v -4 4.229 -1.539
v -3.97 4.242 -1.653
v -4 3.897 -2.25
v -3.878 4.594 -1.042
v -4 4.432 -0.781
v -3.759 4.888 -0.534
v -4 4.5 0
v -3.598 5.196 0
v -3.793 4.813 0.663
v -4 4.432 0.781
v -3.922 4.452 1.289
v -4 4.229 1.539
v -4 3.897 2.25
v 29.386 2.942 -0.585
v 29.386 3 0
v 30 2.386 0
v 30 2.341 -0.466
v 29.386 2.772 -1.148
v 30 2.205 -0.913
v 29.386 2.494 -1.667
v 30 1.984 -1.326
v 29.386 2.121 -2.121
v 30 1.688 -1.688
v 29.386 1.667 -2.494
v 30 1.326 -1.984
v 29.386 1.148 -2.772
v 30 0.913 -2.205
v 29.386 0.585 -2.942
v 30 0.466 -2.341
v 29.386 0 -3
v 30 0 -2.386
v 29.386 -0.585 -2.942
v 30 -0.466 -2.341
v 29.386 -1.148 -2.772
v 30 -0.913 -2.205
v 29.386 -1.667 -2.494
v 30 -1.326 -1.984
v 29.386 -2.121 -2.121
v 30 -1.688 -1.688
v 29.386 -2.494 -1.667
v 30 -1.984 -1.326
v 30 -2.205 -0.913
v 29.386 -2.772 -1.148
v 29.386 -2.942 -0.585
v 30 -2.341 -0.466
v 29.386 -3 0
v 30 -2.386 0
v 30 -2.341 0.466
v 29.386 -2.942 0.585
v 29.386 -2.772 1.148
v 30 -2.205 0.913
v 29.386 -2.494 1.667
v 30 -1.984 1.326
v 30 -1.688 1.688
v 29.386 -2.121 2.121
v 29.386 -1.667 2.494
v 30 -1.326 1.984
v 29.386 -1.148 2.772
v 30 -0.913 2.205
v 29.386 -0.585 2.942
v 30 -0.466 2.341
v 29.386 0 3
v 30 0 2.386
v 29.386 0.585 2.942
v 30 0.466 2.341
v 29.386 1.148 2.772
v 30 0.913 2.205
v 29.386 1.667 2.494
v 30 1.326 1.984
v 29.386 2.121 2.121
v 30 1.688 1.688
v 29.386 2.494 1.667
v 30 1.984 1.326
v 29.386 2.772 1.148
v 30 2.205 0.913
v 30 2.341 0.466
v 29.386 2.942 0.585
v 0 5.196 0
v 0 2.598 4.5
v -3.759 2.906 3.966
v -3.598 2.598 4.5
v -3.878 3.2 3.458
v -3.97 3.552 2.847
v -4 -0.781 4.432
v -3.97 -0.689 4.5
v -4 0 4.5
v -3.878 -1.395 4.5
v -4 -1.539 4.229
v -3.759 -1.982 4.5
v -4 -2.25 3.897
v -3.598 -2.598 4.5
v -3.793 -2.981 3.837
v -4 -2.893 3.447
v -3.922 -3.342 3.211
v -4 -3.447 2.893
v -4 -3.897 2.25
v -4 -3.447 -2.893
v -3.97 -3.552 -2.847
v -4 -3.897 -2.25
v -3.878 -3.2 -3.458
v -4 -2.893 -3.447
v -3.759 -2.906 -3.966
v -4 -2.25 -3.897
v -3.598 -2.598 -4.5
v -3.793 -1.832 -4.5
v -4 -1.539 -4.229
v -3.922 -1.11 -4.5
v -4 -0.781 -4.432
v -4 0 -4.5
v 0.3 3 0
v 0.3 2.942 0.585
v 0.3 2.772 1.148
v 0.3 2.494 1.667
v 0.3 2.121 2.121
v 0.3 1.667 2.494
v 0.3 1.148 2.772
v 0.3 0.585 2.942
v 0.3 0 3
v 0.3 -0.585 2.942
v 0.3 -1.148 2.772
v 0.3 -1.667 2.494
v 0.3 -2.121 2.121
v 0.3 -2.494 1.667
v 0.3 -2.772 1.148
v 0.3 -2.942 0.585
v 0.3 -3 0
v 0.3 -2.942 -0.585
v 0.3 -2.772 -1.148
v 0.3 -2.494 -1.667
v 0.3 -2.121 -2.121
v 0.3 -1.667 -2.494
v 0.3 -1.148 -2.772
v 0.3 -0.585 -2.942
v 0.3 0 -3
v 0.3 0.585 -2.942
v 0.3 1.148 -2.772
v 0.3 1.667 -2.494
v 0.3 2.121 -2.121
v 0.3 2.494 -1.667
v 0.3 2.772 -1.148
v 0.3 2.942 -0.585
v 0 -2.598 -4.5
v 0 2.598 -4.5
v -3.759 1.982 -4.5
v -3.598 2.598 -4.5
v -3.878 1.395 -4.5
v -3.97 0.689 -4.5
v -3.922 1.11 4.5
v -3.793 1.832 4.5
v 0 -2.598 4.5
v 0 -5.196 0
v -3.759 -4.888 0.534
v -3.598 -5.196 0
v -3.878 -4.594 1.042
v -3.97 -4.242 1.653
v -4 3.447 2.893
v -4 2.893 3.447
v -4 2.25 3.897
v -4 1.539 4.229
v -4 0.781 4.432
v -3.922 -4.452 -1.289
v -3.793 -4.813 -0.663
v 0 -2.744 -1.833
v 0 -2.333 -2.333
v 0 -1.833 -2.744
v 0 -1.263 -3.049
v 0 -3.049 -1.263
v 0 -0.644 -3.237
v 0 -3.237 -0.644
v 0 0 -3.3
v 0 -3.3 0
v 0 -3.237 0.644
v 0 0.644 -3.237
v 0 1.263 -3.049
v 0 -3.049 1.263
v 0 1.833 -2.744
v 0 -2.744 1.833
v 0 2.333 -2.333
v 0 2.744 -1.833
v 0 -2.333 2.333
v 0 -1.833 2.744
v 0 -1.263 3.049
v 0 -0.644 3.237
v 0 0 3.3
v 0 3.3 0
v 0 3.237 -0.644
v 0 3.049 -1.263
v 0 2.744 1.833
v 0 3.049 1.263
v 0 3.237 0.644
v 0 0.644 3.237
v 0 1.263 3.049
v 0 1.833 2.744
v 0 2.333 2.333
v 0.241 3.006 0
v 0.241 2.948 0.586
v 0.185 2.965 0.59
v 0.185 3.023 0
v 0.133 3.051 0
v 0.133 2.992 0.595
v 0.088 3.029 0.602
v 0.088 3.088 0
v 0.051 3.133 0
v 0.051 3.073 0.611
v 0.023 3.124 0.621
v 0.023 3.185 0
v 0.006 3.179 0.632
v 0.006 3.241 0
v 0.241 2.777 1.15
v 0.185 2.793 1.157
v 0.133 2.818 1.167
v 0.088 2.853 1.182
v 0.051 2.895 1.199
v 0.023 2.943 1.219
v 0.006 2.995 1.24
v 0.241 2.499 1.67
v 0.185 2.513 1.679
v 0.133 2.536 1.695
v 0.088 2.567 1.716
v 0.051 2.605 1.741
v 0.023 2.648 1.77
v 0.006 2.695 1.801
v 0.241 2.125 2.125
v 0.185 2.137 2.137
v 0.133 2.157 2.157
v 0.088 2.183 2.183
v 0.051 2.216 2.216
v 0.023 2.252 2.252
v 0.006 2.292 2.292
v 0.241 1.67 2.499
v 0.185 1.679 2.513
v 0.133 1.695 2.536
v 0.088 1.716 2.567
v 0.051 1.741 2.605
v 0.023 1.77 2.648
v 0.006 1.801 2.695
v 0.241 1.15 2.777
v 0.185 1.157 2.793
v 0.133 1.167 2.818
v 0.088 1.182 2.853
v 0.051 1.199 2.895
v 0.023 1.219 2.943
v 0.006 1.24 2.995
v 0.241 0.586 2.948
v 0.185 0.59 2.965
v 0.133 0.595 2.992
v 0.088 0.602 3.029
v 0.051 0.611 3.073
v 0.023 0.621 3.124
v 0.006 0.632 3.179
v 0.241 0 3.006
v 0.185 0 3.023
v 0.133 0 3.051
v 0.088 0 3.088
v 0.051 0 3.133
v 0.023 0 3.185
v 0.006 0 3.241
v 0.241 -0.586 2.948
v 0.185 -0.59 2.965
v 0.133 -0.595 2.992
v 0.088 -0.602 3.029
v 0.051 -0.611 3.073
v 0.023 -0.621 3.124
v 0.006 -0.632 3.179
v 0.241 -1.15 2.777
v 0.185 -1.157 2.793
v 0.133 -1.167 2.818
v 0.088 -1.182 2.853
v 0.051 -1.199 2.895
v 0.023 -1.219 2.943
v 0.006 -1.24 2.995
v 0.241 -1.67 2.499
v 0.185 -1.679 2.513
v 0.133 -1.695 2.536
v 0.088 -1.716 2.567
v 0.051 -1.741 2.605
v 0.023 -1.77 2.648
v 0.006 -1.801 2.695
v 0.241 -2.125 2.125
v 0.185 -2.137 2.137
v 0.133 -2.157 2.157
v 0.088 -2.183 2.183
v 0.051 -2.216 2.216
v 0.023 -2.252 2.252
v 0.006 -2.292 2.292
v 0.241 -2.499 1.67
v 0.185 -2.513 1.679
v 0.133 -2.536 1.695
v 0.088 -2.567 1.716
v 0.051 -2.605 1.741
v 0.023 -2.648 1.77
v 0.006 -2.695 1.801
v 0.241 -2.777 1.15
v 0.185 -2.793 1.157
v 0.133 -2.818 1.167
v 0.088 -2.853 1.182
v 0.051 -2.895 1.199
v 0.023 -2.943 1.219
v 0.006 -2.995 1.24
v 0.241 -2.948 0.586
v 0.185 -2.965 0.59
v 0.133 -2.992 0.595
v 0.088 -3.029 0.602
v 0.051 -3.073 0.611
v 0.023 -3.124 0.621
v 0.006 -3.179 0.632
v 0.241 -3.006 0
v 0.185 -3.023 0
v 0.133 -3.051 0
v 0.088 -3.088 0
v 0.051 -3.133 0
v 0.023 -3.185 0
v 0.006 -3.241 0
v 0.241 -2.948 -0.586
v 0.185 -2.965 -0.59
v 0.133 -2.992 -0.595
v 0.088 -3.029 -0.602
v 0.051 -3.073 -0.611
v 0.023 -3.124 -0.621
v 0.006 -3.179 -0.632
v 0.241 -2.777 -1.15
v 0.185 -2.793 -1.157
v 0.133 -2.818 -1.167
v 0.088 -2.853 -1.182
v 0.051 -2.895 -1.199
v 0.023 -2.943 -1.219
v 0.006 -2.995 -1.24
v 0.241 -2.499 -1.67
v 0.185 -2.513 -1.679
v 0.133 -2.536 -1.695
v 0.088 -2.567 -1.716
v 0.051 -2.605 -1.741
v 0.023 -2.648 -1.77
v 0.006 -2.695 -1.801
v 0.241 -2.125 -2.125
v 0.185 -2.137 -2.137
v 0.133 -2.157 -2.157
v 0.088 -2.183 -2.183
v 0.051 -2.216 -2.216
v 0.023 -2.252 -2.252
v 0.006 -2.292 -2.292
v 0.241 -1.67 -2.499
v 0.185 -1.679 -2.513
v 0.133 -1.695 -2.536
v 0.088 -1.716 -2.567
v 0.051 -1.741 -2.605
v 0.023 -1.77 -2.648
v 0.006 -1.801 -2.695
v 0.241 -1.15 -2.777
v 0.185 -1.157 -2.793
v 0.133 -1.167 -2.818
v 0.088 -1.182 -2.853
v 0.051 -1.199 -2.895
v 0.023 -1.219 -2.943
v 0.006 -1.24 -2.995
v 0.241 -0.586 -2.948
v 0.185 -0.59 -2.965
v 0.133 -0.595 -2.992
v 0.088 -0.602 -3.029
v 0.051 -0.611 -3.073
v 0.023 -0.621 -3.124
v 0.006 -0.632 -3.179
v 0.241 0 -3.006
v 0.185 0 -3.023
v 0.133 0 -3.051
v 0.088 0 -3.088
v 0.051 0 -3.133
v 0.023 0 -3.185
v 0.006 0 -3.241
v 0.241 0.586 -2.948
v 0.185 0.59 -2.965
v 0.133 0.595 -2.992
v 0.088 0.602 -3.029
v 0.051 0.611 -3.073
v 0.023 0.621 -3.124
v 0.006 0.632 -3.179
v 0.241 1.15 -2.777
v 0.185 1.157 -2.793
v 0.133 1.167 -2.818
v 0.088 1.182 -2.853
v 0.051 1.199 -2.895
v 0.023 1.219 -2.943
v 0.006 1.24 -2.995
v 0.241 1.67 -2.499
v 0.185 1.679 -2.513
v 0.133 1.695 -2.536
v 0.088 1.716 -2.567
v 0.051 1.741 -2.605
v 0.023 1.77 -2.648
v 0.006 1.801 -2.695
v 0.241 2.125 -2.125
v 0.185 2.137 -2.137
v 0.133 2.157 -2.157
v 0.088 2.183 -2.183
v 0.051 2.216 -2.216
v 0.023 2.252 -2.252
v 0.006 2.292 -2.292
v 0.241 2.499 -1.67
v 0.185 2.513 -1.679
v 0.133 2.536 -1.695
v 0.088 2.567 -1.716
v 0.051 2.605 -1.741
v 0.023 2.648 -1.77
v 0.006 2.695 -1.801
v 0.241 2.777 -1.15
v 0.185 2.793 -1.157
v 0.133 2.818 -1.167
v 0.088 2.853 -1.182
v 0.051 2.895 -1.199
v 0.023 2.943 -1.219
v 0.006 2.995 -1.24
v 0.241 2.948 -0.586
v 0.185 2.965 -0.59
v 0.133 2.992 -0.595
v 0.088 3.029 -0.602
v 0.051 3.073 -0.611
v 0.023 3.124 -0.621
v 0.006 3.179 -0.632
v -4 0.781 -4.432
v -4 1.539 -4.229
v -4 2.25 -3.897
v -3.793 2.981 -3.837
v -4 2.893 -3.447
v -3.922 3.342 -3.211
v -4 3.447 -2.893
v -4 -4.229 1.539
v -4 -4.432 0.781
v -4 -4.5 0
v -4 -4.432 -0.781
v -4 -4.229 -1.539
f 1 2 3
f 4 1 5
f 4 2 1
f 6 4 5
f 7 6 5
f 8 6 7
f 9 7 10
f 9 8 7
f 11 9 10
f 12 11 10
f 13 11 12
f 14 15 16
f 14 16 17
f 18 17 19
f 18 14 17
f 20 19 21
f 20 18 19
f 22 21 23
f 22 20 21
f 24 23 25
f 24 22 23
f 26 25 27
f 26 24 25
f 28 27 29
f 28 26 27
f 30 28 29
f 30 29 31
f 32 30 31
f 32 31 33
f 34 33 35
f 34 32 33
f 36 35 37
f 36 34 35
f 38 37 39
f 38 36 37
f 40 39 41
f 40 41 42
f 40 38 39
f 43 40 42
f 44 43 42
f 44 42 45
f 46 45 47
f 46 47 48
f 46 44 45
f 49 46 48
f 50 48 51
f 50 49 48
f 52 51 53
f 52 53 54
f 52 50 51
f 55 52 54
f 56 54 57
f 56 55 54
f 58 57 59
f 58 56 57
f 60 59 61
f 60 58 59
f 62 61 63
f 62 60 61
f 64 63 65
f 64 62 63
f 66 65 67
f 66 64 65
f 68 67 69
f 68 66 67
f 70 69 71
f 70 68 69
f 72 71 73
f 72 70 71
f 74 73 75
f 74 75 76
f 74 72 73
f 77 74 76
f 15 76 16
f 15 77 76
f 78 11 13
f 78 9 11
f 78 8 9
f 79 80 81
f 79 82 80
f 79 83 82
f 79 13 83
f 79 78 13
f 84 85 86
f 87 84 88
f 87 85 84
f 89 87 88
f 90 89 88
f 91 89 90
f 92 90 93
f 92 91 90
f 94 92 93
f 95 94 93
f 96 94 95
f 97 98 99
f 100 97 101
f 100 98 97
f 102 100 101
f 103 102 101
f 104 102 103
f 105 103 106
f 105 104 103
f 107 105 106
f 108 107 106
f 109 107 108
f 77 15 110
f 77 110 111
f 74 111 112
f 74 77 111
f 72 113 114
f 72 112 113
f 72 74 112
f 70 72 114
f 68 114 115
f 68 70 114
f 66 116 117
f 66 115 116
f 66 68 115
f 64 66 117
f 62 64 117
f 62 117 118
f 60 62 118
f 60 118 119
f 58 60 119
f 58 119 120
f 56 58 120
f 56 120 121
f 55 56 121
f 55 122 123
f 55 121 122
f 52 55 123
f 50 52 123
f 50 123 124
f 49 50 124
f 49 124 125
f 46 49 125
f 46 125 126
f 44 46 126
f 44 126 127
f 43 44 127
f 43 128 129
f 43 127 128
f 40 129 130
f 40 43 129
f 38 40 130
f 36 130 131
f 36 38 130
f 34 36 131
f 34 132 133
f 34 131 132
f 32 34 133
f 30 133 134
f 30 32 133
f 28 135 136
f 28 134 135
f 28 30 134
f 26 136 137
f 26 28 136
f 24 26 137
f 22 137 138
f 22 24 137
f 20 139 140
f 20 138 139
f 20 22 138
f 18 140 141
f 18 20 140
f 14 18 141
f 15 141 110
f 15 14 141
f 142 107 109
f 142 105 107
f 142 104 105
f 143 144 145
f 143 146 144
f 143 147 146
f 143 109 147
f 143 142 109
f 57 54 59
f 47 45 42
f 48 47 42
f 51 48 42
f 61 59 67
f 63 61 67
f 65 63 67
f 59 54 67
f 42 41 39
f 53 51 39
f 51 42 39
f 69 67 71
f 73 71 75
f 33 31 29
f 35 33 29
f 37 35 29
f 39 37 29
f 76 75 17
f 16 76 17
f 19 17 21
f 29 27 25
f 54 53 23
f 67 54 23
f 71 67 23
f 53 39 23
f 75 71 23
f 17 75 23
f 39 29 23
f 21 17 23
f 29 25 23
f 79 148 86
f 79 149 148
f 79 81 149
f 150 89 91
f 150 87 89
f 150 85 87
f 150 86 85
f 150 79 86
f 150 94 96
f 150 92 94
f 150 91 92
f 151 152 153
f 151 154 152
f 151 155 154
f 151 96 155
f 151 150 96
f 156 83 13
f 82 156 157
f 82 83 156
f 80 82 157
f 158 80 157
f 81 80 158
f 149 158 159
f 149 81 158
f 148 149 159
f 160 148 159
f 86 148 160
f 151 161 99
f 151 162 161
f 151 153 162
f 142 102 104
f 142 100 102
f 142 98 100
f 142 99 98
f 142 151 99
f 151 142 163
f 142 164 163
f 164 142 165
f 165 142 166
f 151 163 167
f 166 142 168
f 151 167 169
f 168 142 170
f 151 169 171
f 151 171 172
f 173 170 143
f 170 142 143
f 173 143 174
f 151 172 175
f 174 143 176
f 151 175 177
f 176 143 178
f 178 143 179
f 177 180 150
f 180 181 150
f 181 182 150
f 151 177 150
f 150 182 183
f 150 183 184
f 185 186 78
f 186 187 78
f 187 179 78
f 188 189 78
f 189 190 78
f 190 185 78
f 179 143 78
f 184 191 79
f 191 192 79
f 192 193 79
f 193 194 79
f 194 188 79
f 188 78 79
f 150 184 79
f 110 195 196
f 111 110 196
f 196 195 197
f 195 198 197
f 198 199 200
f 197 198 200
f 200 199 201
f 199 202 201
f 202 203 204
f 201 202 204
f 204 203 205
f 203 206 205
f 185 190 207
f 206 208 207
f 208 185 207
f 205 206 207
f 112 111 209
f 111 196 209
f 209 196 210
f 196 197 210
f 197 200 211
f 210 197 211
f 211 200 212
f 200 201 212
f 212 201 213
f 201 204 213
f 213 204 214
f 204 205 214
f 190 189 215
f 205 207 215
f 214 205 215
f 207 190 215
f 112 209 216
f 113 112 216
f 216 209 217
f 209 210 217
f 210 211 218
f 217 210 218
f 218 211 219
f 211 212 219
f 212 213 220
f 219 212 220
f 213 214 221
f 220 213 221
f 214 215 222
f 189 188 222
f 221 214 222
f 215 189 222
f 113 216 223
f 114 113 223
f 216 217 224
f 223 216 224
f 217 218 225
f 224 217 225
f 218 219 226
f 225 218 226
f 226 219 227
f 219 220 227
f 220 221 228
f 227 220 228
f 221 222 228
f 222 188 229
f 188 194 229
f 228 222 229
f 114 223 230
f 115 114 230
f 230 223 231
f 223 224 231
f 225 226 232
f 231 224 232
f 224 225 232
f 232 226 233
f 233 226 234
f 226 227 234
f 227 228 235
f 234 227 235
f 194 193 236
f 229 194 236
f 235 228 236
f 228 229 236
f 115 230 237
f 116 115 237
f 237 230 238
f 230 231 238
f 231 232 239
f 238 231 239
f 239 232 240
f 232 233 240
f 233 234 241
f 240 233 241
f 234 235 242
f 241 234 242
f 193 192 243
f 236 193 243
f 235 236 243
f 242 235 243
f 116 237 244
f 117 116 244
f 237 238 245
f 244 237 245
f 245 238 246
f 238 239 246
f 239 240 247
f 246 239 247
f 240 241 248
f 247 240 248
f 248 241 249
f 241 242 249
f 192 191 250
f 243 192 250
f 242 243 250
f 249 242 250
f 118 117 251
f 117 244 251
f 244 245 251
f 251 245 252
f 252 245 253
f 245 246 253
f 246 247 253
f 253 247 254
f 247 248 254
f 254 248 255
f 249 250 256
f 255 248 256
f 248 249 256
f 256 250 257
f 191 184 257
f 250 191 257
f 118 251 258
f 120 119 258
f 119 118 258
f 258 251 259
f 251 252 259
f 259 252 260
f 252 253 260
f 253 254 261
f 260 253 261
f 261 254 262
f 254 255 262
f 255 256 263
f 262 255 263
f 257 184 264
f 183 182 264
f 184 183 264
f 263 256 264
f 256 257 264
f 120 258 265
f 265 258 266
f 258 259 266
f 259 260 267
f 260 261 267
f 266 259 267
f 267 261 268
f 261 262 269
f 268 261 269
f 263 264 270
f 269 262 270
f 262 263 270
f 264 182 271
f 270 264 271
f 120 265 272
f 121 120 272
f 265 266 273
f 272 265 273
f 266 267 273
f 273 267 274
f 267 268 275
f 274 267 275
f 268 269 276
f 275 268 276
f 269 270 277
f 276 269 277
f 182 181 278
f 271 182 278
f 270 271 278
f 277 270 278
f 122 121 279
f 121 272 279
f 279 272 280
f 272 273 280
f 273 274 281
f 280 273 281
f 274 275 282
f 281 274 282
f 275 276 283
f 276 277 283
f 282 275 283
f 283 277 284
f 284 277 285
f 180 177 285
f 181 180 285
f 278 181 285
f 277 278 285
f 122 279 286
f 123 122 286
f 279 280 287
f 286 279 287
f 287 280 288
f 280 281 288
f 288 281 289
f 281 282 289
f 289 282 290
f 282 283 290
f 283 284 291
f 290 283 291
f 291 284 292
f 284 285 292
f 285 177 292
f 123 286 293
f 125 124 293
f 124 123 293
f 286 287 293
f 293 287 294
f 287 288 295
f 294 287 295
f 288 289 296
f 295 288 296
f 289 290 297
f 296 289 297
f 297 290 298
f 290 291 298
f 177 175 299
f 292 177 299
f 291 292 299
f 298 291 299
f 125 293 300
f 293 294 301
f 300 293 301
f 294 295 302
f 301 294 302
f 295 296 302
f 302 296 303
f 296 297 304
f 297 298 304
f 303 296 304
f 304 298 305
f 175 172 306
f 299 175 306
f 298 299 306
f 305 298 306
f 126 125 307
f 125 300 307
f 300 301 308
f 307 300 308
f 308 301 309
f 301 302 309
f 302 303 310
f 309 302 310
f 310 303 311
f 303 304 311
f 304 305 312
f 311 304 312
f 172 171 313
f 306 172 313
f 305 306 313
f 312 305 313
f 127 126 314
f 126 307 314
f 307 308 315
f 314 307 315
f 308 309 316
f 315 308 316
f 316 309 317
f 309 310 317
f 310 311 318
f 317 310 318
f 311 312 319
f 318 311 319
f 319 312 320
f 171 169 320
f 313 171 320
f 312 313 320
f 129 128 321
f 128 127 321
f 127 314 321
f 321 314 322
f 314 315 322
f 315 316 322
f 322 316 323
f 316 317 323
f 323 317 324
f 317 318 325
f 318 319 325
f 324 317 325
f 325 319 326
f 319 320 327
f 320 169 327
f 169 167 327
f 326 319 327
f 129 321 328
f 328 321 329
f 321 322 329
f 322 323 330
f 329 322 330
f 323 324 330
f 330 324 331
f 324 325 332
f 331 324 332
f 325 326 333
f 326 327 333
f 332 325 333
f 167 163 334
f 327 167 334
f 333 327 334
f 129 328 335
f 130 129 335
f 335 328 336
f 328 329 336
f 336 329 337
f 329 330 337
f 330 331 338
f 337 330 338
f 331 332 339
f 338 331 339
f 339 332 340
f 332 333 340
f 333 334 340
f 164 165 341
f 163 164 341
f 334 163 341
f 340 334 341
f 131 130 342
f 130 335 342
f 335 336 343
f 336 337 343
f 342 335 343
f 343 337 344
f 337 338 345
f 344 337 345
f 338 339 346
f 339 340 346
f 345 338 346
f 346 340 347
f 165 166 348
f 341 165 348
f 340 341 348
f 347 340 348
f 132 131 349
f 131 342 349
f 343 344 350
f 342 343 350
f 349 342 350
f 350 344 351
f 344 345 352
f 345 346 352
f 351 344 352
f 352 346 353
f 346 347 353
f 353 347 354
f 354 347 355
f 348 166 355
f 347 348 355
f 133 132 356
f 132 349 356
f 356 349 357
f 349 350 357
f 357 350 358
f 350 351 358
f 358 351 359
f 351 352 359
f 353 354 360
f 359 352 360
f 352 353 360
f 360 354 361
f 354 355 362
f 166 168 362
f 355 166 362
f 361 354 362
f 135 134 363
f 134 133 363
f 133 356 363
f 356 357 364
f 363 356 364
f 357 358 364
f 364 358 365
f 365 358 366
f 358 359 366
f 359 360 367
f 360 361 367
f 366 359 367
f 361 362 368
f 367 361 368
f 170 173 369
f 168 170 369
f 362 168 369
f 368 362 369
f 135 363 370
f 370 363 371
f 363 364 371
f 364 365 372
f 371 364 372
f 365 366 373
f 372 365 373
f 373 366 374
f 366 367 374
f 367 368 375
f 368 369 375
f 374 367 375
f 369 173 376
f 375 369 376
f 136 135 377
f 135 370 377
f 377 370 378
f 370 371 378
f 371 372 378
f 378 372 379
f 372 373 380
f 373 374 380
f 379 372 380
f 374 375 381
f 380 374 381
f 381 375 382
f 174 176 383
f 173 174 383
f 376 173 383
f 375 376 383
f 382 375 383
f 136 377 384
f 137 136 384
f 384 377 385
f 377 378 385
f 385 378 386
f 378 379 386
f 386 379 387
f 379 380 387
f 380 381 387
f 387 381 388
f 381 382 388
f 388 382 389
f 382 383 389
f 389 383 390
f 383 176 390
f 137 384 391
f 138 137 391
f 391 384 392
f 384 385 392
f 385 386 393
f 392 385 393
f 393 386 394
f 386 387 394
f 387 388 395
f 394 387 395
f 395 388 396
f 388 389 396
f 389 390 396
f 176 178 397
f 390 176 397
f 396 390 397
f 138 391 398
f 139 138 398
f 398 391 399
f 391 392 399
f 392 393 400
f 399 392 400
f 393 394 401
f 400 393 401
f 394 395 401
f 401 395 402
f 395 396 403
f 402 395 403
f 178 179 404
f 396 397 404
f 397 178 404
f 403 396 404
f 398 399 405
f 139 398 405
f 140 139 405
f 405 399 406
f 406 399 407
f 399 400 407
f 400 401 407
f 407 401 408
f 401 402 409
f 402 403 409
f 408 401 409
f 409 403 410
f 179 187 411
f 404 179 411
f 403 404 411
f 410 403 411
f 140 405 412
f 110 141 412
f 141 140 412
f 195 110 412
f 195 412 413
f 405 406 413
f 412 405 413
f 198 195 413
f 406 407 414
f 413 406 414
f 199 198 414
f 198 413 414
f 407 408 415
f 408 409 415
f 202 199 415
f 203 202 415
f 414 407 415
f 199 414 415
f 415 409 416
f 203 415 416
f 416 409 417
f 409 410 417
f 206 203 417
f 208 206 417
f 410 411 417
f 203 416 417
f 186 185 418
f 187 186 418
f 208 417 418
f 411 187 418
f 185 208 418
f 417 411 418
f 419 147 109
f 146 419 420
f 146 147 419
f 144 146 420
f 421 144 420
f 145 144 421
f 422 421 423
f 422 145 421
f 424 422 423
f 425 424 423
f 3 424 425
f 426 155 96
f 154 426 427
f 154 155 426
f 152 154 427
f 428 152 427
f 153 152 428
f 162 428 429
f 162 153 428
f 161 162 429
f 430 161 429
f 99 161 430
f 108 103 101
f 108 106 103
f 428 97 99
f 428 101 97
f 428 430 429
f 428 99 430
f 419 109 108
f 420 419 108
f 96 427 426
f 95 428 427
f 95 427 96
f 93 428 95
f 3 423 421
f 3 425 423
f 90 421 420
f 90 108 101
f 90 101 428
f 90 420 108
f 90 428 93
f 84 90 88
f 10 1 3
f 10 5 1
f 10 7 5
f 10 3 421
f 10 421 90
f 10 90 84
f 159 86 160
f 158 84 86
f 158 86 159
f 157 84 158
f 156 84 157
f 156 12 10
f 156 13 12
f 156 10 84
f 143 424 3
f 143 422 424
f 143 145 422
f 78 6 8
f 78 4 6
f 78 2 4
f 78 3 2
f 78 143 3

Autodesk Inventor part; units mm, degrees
ref_plane "YZ Plane" through (0, 0, 0) normal (1, 0, 0) x (0, 1, 0)
ref_plane "XZ Plane" through (0, 0, 0) normal (0, 1, 0) x (-1, 0, 0)
sketch "Sketch1" plane through (0, 0, 0) normal (0, 0, 1) x (1, 0, 0)
  line L0 (0, 3) -> (30, 3)
  line L1 (30, 3) -> (30, 0)
  line L2 (30, 0) -> (0, 0)
  line L3 (-6, 0) -> (36, 0) projected
  line L4 (0, -0.6) -> (0, 3.6) projected
  line L5 (0, 3) -> (0, 0)
  dimension "d2" = 6
  dimension "d59" = 30
revolve "Body" add sketch "Sketch1" angle 360 about axis through (30, 0, 0) along (-1, 0, 0)
sketch "Sketch2" plane through (0, 0, 0) normal (-1, 0, 0) x (0, 0, 1)
  line L0 (0, 5.1962) -> (4.5, 2.5981)
  line L1 (4.5, 2.5981) -> (4.5, -2.5981)
  line L2 (4.5, -2.5981) -> (0, -5.1962)
  line L3 (0, -5.1962) -> (-4.5, -2.5981)
  line L4 (-4.5, -2.5981) -> (-4.5, 2.5981)
  line L5 (-4.5, 2.5981) -> (0, 5.1962)
  line L6 (-6.3, 0) -> (6.3, 0) projected
  line L7 (0, 7.2746) -> (0, -7.2746) projected
  point P0 (0, 0)
  point P1 (0, 0)
  dimension "d11" = 9
extrude "Head" add sketch "Sketch2" along normal blind 4
sketch "Sketch4" plane through (0, 0, 0) normal (0, 0, 1) x (1, 0, 0)
  line L0 (-3.4804, 5.4) -> (-4, 4.5)
  line L1 (-1.1, 0) -> (-0.234, 0)
  line L2 (-4.7532, 0) -> (0.5192, 0) projected
  line L3 (-4, 5.4) -> (-3.4804, 5.4)
  line L4 (-4, 4.5) -> (-4, 5.4)
  line L5 (0, 6.48) -> (0, -1.08) projected
  dimension "d65" = 9
  dimension "d67" = 30
  dimension "d68" = 10.8
  dimension "d69" = 4
revolve "Chamfer1" cut sketch "Sketch4" angle 360 about axis through (-1.1, 0, 0) along (1, 0, 0)
thread "Thread" size "M6x1" class "6g" standard "ISO Metric profile" length 11
chamfer "Chamfer2" distance 0.6135 distance2 0.6136 1 edges at (30, -3, 0) measured on face at (30, -0.5525, 1.8157)
fillet "Fillet2" radius 0.3 1 edges at (0, -3, 0)
ref_plane "Work Plane1" through (1.525, 0, 0) normal (0, 0, 1) x (1, 0, 0)
equation "\"d71\" = RR"
equation "\"d11\" = SW"
equation "\"d3\" = KOH"
equation "\"d15\" = GEL"
equation "\"d6\" = -0.5 * SPD + 0.5 * GD"
equation "\"d2\" = GD"
equation "\"d59\" = NLG"
equation "\"d65\" = SW"
equation "\"d67\" = ANG1"
equation "\"d68\" = 1.2 * SW"
equation "\"d69\" = KOH"
equation "\"NLG\" = 30"
equation "\"GD\" = NND"
equation "\"BDM\" = NND"
equation "\"KOH\" = 4"
equation "\"GEL\" = 11"
equation "\"SW\" = 9"
equation "\"SW0\" = 9"
equation "\"SPD\" = NND - 1.2269 * PTC"
equation "\"SD2\" = NND"
equation "\"SD\" = 0"
equation "\"ANG1\" = 30deg"
equation "\"GAL\" = 0.61345 * PTC"
equation "\"GUL\" = 0.61345 * PTC"
equation "\"RR\" = 0.3"
equation "\"RR1\" = 0.1"
equation "\"GD1\" = THREADDIA - 1.2269 * PTC"
equation "\"THREADDIA\" = 6"
equation "\"TOA\" = 30deg"
equation "\"FAWI\" = 60deg"
equation "\"PTC\" = 1"
equation "\"NND\" = 6"
equation "\"E0\" = 1.155 * SW"
properties part number "CSN 02 1201 - M6 x 30" material "Steel, Mild"
